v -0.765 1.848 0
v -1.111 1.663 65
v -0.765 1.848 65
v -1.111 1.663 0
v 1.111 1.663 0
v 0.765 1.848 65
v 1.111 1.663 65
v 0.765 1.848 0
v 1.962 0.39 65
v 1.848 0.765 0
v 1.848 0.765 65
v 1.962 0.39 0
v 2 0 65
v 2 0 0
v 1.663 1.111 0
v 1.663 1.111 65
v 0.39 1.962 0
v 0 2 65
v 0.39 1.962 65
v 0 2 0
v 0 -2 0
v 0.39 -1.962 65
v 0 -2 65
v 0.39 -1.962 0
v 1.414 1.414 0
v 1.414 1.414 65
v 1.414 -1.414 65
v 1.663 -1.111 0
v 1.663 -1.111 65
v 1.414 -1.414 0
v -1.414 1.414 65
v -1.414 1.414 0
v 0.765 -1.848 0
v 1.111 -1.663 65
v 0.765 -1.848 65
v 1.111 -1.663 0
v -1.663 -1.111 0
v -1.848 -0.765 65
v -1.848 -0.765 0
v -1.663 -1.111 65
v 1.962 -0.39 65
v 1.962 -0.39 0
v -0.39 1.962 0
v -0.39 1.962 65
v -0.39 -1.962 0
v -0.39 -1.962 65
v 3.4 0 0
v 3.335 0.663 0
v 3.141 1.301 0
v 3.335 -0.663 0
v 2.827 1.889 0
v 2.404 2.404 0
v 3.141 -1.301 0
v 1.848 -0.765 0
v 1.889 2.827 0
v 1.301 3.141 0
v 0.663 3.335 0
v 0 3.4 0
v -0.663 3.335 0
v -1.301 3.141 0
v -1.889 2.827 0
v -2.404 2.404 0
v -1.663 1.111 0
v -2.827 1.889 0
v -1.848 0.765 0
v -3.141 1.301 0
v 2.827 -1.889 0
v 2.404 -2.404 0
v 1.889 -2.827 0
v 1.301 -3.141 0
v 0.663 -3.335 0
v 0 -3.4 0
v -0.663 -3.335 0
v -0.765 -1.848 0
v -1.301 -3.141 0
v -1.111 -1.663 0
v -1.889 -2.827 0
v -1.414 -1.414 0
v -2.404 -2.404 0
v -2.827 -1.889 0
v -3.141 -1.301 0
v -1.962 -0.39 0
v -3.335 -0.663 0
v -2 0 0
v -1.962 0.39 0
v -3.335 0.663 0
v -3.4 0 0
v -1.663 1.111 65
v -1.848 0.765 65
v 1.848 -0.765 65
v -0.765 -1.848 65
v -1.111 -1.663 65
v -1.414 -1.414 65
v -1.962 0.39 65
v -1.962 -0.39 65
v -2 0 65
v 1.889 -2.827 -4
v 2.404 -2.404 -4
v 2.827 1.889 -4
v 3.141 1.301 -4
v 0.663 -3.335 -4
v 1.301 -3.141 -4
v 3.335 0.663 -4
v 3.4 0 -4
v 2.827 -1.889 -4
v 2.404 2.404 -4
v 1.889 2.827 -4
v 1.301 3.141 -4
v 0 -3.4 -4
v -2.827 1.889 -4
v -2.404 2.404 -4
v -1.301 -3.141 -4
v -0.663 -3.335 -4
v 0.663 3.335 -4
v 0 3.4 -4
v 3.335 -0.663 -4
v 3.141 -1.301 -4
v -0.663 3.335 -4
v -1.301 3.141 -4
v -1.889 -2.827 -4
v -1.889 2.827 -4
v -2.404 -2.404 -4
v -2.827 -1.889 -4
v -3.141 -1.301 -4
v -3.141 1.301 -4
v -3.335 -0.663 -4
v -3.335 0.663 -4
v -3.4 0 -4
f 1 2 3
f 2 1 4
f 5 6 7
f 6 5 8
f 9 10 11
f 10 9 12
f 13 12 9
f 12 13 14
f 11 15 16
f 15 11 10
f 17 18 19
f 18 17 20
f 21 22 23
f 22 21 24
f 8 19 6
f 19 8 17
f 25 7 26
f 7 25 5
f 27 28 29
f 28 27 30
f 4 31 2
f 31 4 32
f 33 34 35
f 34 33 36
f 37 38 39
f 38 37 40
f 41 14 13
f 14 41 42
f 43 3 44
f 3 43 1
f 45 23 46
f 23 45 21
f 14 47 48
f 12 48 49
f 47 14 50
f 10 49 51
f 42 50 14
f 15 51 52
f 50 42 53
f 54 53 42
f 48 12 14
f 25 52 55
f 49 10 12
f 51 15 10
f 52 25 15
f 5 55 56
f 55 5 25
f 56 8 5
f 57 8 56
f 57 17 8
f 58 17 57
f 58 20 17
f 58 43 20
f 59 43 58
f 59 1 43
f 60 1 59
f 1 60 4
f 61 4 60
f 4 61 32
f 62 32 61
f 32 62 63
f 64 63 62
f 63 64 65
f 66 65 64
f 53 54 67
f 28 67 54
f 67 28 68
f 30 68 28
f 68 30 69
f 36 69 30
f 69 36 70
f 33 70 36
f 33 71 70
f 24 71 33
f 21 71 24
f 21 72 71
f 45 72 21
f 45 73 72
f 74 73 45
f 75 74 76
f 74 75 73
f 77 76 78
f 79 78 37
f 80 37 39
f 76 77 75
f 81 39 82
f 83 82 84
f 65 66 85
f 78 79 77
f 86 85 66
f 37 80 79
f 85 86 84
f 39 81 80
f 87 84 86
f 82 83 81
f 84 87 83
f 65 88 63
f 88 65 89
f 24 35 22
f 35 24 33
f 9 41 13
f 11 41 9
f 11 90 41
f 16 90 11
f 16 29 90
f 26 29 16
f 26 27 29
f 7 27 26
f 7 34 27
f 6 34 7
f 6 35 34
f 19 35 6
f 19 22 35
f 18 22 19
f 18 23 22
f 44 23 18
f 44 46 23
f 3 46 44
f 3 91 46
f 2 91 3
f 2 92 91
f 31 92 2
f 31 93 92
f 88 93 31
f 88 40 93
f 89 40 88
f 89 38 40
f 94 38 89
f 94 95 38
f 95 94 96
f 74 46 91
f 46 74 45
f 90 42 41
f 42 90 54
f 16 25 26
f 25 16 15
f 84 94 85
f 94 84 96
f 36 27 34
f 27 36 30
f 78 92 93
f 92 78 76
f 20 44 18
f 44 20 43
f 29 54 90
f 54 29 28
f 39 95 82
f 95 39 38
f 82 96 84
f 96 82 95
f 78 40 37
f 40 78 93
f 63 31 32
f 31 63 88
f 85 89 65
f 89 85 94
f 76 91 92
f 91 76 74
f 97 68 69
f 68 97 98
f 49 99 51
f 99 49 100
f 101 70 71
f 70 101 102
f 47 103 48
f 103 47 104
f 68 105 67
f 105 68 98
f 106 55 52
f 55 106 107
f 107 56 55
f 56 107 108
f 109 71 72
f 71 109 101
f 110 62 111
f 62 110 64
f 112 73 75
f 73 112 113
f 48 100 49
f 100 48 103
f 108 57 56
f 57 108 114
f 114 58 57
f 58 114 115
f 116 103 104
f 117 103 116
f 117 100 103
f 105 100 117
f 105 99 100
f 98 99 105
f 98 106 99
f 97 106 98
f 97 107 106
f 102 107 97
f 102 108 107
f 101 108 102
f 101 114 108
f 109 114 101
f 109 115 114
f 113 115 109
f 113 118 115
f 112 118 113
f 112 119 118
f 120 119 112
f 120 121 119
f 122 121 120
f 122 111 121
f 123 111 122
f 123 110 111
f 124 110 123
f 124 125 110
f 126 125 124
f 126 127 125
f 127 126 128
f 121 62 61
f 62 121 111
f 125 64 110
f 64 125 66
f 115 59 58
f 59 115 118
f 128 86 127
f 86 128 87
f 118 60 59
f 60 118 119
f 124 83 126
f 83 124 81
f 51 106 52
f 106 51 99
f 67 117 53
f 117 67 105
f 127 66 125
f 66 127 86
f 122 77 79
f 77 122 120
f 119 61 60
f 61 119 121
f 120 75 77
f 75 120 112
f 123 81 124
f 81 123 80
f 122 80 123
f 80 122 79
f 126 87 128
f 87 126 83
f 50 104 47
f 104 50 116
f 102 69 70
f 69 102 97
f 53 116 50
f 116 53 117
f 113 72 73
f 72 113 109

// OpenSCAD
// Purchased hardware envelope. Not printable.
$fn=32;union(){cylinder(d=4,h=65);translate([0,0,-4])cylinder(d=6.8,h=4);}
